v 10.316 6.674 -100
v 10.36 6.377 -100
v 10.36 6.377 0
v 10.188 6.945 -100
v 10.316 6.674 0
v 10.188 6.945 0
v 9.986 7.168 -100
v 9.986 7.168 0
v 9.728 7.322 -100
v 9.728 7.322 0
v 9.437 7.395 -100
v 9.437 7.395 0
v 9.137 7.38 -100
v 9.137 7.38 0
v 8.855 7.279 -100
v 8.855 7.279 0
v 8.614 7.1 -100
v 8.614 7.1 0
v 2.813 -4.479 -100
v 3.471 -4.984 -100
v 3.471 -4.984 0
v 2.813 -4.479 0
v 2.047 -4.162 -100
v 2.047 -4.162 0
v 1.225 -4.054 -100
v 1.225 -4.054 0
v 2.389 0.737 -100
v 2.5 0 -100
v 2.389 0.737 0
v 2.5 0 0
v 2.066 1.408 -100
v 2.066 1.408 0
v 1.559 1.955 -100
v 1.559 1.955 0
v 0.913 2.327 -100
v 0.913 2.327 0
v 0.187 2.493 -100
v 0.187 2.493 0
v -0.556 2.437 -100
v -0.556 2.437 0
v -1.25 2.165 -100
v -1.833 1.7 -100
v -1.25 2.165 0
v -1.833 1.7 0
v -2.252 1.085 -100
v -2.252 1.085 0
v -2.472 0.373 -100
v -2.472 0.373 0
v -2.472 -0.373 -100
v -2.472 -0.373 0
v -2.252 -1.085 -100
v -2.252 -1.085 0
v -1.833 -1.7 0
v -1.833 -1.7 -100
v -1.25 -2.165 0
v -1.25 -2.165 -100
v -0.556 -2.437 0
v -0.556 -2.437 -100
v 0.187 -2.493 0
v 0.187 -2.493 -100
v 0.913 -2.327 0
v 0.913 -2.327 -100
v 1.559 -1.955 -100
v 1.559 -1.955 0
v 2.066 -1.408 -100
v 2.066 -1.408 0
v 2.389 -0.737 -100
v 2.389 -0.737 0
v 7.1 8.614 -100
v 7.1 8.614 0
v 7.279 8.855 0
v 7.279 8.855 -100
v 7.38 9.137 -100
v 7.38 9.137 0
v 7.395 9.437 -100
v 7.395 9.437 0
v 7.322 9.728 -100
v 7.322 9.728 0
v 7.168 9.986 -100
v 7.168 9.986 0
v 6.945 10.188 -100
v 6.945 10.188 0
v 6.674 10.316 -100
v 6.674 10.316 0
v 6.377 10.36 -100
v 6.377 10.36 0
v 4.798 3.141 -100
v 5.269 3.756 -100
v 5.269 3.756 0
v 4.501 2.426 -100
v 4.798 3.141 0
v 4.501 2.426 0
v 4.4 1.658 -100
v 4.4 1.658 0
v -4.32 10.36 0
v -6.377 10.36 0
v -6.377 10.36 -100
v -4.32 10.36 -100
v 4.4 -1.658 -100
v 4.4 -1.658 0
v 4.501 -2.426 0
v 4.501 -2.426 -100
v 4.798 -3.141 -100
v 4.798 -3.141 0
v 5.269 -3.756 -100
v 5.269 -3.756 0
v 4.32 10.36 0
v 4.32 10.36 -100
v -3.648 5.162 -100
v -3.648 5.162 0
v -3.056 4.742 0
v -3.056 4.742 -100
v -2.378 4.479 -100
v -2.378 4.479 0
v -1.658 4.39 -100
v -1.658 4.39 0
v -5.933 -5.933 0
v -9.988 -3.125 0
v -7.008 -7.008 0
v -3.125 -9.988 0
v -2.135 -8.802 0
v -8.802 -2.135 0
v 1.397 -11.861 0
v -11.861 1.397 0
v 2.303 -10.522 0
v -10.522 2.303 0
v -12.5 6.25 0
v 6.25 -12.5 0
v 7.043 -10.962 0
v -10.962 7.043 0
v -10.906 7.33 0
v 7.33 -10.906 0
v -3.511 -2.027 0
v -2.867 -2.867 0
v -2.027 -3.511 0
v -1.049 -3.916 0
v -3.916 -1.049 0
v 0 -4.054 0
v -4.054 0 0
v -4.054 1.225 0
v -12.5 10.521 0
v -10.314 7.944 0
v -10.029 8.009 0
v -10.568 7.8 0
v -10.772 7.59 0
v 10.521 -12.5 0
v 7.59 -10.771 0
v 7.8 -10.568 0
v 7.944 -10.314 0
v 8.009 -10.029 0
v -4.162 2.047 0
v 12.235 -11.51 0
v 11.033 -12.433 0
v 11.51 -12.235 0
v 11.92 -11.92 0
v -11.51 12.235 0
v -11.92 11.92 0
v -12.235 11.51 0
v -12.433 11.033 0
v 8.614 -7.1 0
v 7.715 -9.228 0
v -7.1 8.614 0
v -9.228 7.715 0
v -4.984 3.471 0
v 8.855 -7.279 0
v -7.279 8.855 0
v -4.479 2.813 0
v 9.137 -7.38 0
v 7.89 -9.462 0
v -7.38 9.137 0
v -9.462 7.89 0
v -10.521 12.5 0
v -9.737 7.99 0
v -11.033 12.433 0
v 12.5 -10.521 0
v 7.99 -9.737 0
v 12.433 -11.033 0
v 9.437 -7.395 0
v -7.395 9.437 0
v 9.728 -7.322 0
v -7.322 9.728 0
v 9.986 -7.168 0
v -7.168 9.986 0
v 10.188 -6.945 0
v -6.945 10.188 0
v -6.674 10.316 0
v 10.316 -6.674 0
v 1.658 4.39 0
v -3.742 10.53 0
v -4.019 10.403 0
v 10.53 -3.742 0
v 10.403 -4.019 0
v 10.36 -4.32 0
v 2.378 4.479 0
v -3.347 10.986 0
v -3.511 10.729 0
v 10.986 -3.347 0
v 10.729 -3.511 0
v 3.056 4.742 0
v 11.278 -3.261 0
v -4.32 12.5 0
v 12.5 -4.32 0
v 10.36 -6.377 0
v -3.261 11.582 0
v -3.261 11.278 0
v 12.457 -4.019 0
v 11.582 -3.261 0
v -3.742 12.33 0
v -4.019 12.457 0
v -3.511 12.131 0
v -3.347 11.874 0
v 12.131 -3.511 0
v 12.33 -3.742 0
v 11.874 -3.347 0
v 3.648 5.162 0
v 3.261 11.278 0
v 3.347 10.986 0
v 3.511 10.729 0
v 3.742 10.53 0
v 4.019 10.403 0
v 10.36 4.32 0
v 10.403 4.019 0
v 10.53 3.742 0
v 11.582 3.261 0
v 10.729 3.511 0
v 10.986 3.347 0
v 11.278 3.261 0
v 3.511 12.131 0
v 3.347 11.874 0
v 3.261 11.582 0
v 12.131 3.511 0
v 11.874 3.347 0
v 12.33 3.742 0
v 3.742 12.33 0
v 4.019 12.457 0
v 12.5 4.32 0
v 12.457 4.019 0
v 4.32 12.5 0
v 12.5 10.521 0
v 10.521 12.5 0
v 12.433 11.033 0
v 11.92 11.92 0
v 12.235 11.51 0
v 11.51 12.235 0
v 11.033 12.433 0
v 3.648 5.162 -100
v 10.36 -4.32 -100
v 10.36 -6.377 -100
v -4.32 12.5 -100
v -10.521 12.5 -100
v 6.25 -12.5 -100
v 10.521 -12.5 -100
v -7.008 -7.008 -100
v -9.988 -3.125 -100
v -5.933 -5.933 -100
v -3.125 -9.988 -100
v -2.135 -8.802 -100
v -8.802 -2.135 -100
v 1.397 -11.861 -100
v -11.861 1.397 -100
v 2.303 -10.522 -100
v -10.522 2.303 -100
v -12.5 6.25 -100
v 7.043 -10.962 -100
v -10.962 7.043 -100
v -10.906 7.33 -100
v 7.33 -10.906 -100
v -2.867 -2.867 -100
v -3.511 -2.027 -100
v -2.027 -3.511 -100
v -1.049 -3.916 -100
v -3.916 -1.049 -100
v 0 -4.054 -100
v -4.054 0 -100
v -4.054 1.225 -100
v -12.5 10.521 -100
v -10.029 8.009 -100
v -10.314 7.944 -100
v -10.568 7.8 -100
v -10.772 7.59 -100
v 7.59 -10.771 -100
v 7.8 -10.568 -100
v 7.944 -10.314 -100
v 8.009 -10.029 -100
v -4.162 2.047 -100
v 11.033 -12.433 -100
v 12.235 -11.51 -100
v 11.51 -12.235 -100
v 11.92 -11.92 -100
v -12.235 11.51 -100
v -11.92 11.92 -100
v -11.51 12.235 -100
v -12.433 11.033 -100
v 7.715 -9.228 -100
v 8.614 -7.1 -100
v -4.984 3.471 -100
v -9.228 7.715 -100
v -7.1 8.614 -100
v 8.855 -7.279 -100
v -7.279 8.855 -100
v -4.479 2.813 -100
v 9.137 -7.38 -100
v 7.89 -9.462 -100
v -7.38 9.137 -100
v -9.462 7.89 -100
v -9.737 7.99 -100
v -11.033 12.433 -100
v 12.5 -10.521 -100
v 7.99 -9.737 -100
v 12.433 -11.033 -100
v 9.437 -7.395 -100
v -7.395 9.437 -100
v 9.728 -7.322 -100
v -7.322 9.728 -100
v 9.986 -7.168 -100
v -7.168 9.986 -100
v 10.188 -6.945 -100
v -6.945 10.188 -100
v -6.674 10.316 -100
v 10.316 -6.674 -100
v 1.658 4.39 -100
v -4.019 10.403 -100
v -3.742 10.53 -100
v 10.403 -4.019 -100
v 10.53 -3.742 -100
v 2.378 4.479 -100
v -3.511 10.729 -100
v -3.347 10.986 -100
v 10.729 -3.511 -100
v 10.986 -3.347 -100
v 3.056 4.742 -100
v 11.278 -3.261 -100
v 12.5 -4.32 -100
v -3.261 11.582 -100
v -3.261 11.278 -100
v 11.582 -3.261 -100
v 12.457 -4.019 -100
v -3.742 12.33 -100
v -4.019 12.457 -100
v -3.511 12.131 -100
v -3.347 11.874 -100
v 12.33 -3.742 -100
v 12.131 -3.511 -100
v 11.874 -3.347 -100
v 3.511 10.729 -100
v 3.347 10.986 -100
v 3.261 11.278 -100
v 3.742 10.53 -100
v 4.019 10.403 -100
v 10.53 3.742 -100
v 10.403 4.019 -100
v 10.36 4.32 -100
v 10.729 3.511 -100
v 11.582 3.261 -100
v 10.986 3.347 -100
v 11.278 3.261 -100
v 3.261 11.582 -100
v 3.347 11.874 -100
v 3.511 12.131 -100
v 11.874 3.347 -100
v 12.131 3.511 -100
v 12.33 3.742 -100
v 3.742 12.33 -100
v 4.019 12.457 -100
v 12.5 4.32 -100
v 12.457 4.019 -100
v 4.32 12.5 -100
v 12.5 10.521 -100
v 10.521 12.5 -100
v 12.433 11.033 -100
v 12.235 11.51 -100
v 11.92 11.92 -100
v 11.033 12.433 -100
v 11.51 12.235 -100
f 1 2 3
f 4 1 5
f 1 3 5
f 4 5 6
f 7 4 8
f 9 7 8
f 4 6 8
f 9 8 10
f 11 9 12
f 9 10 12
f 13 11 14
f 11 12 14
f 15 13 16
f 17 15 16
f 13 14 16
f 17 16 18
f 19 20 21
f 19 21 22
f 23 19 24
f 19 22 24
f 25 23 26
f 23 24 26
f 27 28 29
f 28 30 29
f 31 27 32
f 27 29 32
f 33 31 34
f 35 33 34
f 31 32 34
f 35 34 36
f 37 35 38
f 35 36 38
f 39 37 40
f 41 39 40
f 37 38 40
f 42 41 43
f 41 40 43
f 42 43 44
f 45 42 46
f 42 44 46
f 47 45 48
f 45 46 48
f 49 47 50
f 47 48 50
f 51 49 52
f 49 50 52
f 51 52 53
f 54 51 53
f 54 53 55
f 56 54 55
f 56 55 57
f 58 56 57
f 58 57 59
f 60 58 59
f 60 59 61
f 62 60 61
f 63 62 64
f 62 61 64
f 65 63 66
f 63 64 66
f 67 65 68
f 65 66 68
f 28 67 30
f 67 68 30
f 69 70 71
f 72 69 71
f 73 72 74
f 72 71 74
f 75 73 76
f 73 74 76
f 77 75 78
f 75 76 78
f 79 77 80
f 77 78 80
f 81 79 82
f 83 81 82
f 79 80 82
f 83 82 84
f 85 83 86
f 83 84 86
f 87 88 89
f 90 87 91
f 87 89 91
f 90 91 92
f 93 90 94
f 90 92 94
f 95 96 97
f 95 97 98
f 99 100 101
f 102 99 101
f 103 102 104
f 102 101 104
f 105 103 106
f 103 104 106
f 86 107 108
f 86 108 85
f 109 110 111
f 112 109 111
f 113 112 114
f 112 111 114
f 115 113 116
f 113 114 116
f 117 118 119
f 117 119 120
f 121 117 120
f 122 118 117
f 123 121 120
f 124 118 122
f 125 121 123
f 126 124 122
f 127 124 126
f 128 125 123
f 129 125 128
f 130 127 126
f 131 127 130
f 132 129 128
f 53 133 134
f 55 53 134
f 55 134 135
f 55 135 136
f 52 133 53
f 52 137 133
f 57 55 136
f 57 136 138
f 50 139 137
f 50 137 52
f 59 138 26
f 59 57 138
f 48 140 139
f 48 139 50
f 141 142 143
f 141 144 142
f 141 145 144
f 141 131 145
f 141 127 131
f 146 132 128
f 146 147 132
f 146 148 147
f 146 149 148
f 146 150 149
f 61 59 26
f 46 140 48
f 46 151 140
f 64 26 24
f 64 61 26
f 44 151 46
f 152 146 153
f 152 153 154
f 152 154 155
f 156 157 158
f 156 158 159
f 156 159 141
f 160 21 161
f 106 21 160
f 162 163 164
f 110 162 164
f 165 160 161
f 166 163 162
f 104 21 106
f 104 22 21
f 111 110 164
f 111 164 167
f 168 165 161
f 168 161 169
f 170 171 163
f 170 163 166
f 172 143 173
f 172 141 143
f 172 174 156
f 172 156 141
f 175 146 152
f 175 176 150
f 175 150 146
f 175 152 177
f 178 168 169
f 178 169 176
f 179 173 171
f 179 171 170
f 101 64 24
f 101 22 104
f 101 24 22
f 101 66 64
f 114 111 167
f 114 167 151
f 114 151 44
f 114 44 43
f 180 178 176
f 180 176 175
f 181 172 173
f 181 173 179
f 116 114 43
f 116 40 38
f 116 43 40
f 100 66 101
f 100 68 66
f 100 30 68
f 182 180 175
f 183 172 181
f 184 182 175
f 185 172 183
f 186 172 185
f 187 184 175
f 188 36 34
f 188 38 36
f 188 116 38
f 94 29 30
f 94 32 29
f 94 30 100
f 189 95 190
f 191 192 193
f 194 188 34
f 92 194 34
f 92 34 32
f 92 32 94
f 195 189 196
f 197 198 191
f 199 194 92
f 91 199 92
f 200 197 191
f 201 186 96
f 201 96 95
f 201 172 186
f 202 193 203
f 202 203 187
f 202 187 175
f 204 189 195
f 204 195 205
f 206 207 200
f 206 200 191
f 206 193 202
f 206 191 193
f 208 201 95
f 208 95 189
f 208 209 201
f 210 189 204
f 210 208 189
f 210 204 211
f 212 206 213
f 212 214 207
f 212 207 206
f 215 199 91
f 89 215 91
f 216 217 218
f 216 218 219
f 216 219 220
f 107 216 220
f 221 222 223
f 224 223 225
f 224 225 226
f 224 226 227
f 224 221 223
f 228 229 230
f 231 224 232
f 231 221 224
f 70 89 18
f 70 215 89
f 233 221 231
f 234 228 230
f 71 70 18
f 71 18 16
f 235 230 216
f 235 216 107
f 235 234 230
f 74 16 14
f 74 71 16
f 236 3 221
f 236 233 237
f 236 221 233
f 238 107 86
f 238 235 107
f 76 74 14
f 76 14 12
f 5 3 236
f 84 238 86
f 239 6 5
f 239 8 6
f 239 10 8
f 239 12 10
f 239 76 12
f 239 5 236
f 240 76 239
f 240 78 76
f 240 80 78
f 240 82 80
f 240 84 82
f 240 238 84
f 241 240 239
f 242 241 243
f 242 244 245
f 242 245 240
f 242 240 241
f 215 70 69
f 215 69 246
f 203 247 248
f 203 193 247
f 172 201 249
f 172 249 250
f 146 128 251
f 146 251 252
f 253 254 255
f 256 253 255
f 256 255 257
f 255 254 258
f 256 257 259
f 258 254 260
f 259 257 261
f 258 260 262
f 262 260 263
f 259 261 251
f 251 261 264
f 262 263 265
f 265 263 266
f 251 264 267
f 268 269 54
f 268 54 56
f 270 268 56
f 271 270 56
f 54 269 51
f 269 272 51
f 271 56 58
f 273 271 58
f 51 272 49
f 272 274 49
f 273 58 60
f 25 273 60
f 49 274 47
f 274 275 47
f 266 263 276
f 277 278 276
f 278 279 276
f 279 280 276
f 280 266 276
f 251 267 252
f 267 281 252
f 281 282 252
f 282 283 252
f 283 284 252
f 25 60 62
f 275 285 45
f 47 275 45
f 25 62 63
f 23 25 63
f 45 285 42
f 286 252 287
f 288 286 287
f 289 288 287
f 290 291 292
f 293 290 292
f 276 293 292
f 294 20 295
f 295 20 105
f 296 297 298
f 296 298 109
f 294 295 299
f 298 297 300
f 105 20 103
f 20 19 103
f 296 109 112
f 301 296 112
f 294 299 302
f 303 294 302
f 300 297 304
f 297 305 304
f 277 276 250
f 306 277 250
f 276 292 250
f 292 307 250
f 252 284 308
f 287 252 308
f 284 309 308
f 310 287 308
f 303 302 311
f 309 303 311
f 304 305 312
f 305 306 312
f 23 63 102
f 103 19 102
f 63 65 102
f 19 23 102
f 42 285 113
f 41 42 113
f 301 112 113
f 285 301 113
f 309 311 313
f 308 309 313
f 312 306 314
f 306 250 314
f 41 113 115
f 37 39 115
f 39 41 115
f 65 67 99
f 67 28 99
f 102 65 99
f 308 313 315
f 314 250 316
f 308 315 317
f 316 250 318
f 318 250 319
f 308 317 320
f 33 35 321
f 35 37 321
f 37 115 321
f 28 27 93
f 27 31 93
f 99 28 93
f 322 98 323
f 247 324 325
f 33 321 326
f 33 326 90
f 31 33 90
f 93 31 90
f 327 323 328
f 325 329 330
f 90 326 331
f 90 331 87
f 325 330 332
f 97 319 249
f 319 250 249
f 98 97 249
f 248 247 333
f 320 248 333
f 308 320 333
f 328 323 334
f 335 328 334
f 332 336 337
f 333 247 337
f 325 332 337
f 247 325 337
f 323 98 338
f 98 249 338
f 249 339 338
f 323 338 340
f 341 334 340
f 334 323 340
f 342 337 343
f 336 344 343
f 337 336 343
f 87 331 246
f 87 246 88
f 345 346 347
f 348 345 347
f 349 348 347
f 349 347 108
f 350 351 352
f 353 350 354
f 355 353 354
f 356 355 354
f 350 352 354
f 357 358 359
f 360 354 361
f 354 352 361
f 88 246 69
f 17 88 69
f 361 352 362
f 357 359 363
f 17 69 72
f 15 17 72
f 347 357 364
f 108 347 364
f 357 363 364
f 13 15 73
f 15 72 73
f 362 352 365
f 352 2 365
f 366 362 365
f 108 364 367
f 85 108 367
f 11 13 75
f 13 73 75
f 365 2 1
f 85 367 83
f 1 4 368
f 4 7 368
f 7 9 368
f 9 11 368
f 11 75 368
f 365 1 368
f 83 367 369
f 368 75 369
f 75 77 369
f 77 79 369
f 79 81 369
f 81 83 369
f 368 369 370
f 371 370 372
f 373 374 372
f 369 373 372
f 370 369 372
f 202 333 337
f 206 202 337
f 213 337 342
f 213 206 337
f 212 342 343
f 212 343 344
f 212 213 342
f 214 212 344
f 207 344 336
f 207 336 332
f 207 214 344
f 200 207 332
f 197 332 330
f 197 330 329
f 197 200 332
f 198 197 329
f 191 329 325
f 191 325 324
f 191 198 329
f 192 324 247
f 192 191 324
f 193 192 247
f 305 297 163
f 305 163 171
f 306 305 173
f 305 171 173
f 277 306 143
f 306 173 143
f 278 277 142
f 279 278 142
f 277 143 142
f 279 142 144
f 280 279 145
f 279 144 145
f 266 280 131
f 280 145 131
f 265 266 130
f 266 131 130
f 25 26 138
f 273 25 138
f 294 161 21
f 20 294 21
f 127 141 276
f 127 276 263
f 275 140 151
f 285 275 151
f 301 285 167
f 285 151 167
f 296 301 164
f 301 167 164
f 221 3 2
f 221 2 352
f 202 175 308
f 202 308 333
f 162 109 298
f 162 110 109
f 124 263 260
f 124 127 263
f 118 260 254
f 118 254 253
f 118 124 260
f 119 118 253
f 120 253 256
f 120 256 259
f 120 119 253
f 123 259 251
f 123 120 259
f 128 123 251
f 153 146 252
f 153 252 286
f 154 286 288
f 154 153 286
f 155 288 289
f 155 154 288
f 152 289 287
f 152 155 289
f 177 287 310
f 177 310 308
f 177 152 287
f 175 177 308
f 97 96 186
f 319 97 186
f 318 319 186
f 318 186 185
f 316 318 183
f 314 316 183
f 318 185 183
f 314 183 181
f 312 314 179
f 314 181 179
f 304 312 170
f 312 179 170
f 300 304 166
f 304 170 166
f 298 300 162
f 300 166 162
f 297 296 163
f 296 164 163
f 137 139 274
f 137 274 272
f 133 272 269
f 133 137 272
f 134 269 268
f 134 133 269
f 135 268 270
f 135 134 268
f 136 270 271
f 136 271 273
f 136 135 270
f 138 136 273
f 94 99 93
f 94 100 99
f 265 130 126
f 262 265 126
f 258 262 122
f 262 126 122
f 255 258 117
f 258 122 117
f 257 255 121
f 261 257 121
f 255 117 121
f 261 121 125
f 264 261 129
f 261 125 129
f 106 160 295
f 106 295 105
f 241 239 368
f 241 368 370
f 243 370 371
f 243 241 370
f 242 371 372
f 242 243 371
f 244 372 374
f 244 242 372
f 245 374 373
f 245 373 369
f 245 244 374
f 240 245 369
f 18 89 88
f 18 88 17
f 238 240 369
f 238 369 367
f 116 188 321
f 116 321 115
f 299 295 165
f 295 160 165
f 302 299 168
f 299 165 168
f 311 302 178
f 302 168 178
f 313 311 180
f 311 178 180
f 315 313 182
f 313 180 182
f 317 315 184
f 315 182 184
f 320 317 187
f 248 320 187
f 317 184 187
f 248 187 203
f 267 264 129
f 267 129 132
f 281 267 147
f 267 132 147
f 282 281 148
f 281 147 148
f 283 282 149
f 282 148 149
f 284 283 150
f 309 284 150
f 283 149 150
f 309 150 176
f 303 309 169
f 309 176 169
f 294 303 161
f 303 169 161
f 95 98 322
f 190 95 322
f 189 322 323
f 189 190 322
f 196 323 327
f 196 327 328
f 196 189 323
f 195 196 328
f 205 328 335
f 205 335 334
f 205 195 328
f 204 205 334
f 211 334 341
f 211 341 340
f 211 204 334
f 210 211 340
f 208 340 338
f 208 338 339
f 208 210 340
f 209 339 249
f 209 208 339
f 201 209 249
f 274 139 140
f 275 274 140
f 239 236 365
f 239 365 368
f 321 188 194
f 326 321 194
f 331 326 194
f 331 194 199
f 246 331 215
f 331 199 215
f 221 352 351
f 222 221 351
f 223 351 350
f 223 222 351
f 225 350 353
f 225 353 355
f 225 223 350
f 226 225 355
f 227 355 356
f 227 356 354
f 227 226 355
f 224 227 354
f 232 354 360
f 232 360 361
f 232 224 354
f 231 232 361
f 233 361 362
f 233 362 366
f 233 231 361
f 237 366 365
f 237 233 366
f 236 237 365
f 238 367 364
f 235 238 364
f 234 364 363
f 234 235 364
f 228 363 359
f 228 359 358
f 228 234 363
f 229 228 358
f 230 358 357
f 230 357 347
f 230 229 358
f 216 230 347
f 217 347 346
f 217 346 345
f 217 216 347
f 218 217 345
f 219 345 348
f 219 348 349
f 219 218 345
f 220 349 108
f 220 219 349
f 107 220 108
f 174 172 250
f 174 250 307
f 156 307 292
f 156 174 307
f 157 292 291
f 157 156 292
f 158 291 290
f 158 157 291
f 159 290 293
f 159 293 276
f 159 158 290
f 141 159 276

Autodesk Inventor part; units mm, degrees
ref_plane "YZ Plane" through (0, 0, 0) normal (1, 0, 0) x (0, 1, 0)
ref_plane "XZ Plane" through (0, 0, 0) normal (0, 1, 0) x (-1, 0, 0)
ref_plane "XY Plane" through (0, 0, 0) normal (0, 0, 1) x (1, 0, 0)
sketch "Sketch1" plane through (0, 0, 0) normal (0, 0, 1) x (1, 0, 0)
  arc A0 (-10.9617, 7.0429) -> (7.0429, -10.9617) centre (6.25, 6.25) ccw
  arc A1 (-9.228, 7.7147) -> (-10.9617, 7.0429) centre (-9.9466, 6.9961) ccw
  line L0 (-4.9841, 3.4709) -> (-9.228, 7.7147)
  arc A2 (-4.054, 1.2253) -> (-4.9841, 3.4709) centre (-7.2298, 1.2253) ccw
  line L1 (-4.054, 0) -> (-4.054, 1.2253)
  arc A3 (-4.054, 0) -> (0, -4.054) centre (0, 0) ccw
  line L2 (1.2253, -4.054) -> (0, -4.054)
  arc A4 (3.4709, -4.9841) -> (1.2253, -4.054) centre (1.2253, -7.2298) ccw
  line L3 (7.7147, -9.228) -> (3.4709, -4.9841)
  arc A5 (7.0429, -10.9617) -> (7.7147, -9.228) centre (6.9961, -9.9466) ccw
  circle A6 centre (0, 0) radius 2.5
  arc A7 (5.2692, 3.756) -> (4.4, 1.6576) centre (7.3675, 1.6576) ccw
  line L4 (5.2692, 3.756) -> (8.6136, 7.1004)
  arc A8 (10.36, 6.377) -> (8.6136, 7.1004) centre (9.337, 6.377) ccw
  line L5 (10.36, 6.377) -> (10.36, 4.32)
  arc A9 (10.36, 4.32) -> (12.5, 4.32) centre (11.43, 4.32) ccw
  line L6 (12.5, 4.32) -> (12.5, 10.5209)
  arc A10 (12.5, 10.5209) -> (10.5209, 12.5) centre (10.5209, 10.5209) ccw
  line L7 (10.5209, 12.5) -> (4.32, 12.5)
  arc A11 (4.32, 12.5) -> (4.32, 10.36) centre (4.32, 11.43) ccw
  line L8 (4.32, 10.36) -> (6.377, 10.36)
  arc A12 (7.1004, 8.6136) -> (6.377, 10.36) centre (6.377, 9.337) ccw
  line L9 (7.1004, 8.6136) -> (3.6484, 5.1617)
  arc A13 (1.6576, 4.39) -> (3.6484, 5.1617) centre (1.6576, 7.344) ccw
  line L10 (1.6576, 4.39) -> (-1.6576, 4.39)
  arc A14 (-3.6484, 5.1617) -> (-1.6576, 4.39) centre (-1.6576, 7.344) ccw
  line L11 (-3.6484, 5.1617) -> (-7.1004, 8.6136)
  arc A15 (-6.377, 10.36) -> (-7.1004, 8.6136) centre (-6.377, 9.337) ccw
  line L12 (-6.377, 10.36) -> (-4.32, 10.36)
  arc A16 (-4.32, 10.36) -> (-4.32, 12.5) centre (-4.32, 11.43) ccw
  line L13 (-4.32, 12.5) -> (-10.5209, 12.5)
  arc A17 (-10.5209, 12.5) -> (-12.5, 10.5209) centre (-10.5209, 10.5209) ccw
  line L14 (-12.5, 10.5209) -> (-12.5, 6.25)
  arc A18 (-12.5, 6.25) -> (6.25, -12.5) centre (6.25, 6.25) ccw
  line L15 (6.25, -12.5) -> (10.5209, -12.5)
  arc A19 (10.5209, -12.5) -> (12.5, -10.5209) centre (10.5209, -10.5209) ccw
  line L16 (12.5, -10.5209) -> (12.5, -4.32)
  arc A20 (12.5, -4.32) -> (10.36, -4.32) centre (11.43, -4.32) ccw
  line L17 (10.36, -4.32) -> (10.36, -6.377)
  arc A21 (8.6136, -7.1004) -> (10.36, -6.377) centre (9.337, -6.377) ccw
  line L18 (8.6136, -7.1004) -> (5.2692, -3.756)
  arc A22 (4.4, -1.6576) -> (5.2692, -3.756) centre (7.3675, -1.6576) ccw
  line L19 (4.4, -1.6576) -> (4.4, 1.6576)
extrude "Extrusion1" add sketch "Sketch1" against normal blind 100
properties part number "25-2527-BLACK-FB"
